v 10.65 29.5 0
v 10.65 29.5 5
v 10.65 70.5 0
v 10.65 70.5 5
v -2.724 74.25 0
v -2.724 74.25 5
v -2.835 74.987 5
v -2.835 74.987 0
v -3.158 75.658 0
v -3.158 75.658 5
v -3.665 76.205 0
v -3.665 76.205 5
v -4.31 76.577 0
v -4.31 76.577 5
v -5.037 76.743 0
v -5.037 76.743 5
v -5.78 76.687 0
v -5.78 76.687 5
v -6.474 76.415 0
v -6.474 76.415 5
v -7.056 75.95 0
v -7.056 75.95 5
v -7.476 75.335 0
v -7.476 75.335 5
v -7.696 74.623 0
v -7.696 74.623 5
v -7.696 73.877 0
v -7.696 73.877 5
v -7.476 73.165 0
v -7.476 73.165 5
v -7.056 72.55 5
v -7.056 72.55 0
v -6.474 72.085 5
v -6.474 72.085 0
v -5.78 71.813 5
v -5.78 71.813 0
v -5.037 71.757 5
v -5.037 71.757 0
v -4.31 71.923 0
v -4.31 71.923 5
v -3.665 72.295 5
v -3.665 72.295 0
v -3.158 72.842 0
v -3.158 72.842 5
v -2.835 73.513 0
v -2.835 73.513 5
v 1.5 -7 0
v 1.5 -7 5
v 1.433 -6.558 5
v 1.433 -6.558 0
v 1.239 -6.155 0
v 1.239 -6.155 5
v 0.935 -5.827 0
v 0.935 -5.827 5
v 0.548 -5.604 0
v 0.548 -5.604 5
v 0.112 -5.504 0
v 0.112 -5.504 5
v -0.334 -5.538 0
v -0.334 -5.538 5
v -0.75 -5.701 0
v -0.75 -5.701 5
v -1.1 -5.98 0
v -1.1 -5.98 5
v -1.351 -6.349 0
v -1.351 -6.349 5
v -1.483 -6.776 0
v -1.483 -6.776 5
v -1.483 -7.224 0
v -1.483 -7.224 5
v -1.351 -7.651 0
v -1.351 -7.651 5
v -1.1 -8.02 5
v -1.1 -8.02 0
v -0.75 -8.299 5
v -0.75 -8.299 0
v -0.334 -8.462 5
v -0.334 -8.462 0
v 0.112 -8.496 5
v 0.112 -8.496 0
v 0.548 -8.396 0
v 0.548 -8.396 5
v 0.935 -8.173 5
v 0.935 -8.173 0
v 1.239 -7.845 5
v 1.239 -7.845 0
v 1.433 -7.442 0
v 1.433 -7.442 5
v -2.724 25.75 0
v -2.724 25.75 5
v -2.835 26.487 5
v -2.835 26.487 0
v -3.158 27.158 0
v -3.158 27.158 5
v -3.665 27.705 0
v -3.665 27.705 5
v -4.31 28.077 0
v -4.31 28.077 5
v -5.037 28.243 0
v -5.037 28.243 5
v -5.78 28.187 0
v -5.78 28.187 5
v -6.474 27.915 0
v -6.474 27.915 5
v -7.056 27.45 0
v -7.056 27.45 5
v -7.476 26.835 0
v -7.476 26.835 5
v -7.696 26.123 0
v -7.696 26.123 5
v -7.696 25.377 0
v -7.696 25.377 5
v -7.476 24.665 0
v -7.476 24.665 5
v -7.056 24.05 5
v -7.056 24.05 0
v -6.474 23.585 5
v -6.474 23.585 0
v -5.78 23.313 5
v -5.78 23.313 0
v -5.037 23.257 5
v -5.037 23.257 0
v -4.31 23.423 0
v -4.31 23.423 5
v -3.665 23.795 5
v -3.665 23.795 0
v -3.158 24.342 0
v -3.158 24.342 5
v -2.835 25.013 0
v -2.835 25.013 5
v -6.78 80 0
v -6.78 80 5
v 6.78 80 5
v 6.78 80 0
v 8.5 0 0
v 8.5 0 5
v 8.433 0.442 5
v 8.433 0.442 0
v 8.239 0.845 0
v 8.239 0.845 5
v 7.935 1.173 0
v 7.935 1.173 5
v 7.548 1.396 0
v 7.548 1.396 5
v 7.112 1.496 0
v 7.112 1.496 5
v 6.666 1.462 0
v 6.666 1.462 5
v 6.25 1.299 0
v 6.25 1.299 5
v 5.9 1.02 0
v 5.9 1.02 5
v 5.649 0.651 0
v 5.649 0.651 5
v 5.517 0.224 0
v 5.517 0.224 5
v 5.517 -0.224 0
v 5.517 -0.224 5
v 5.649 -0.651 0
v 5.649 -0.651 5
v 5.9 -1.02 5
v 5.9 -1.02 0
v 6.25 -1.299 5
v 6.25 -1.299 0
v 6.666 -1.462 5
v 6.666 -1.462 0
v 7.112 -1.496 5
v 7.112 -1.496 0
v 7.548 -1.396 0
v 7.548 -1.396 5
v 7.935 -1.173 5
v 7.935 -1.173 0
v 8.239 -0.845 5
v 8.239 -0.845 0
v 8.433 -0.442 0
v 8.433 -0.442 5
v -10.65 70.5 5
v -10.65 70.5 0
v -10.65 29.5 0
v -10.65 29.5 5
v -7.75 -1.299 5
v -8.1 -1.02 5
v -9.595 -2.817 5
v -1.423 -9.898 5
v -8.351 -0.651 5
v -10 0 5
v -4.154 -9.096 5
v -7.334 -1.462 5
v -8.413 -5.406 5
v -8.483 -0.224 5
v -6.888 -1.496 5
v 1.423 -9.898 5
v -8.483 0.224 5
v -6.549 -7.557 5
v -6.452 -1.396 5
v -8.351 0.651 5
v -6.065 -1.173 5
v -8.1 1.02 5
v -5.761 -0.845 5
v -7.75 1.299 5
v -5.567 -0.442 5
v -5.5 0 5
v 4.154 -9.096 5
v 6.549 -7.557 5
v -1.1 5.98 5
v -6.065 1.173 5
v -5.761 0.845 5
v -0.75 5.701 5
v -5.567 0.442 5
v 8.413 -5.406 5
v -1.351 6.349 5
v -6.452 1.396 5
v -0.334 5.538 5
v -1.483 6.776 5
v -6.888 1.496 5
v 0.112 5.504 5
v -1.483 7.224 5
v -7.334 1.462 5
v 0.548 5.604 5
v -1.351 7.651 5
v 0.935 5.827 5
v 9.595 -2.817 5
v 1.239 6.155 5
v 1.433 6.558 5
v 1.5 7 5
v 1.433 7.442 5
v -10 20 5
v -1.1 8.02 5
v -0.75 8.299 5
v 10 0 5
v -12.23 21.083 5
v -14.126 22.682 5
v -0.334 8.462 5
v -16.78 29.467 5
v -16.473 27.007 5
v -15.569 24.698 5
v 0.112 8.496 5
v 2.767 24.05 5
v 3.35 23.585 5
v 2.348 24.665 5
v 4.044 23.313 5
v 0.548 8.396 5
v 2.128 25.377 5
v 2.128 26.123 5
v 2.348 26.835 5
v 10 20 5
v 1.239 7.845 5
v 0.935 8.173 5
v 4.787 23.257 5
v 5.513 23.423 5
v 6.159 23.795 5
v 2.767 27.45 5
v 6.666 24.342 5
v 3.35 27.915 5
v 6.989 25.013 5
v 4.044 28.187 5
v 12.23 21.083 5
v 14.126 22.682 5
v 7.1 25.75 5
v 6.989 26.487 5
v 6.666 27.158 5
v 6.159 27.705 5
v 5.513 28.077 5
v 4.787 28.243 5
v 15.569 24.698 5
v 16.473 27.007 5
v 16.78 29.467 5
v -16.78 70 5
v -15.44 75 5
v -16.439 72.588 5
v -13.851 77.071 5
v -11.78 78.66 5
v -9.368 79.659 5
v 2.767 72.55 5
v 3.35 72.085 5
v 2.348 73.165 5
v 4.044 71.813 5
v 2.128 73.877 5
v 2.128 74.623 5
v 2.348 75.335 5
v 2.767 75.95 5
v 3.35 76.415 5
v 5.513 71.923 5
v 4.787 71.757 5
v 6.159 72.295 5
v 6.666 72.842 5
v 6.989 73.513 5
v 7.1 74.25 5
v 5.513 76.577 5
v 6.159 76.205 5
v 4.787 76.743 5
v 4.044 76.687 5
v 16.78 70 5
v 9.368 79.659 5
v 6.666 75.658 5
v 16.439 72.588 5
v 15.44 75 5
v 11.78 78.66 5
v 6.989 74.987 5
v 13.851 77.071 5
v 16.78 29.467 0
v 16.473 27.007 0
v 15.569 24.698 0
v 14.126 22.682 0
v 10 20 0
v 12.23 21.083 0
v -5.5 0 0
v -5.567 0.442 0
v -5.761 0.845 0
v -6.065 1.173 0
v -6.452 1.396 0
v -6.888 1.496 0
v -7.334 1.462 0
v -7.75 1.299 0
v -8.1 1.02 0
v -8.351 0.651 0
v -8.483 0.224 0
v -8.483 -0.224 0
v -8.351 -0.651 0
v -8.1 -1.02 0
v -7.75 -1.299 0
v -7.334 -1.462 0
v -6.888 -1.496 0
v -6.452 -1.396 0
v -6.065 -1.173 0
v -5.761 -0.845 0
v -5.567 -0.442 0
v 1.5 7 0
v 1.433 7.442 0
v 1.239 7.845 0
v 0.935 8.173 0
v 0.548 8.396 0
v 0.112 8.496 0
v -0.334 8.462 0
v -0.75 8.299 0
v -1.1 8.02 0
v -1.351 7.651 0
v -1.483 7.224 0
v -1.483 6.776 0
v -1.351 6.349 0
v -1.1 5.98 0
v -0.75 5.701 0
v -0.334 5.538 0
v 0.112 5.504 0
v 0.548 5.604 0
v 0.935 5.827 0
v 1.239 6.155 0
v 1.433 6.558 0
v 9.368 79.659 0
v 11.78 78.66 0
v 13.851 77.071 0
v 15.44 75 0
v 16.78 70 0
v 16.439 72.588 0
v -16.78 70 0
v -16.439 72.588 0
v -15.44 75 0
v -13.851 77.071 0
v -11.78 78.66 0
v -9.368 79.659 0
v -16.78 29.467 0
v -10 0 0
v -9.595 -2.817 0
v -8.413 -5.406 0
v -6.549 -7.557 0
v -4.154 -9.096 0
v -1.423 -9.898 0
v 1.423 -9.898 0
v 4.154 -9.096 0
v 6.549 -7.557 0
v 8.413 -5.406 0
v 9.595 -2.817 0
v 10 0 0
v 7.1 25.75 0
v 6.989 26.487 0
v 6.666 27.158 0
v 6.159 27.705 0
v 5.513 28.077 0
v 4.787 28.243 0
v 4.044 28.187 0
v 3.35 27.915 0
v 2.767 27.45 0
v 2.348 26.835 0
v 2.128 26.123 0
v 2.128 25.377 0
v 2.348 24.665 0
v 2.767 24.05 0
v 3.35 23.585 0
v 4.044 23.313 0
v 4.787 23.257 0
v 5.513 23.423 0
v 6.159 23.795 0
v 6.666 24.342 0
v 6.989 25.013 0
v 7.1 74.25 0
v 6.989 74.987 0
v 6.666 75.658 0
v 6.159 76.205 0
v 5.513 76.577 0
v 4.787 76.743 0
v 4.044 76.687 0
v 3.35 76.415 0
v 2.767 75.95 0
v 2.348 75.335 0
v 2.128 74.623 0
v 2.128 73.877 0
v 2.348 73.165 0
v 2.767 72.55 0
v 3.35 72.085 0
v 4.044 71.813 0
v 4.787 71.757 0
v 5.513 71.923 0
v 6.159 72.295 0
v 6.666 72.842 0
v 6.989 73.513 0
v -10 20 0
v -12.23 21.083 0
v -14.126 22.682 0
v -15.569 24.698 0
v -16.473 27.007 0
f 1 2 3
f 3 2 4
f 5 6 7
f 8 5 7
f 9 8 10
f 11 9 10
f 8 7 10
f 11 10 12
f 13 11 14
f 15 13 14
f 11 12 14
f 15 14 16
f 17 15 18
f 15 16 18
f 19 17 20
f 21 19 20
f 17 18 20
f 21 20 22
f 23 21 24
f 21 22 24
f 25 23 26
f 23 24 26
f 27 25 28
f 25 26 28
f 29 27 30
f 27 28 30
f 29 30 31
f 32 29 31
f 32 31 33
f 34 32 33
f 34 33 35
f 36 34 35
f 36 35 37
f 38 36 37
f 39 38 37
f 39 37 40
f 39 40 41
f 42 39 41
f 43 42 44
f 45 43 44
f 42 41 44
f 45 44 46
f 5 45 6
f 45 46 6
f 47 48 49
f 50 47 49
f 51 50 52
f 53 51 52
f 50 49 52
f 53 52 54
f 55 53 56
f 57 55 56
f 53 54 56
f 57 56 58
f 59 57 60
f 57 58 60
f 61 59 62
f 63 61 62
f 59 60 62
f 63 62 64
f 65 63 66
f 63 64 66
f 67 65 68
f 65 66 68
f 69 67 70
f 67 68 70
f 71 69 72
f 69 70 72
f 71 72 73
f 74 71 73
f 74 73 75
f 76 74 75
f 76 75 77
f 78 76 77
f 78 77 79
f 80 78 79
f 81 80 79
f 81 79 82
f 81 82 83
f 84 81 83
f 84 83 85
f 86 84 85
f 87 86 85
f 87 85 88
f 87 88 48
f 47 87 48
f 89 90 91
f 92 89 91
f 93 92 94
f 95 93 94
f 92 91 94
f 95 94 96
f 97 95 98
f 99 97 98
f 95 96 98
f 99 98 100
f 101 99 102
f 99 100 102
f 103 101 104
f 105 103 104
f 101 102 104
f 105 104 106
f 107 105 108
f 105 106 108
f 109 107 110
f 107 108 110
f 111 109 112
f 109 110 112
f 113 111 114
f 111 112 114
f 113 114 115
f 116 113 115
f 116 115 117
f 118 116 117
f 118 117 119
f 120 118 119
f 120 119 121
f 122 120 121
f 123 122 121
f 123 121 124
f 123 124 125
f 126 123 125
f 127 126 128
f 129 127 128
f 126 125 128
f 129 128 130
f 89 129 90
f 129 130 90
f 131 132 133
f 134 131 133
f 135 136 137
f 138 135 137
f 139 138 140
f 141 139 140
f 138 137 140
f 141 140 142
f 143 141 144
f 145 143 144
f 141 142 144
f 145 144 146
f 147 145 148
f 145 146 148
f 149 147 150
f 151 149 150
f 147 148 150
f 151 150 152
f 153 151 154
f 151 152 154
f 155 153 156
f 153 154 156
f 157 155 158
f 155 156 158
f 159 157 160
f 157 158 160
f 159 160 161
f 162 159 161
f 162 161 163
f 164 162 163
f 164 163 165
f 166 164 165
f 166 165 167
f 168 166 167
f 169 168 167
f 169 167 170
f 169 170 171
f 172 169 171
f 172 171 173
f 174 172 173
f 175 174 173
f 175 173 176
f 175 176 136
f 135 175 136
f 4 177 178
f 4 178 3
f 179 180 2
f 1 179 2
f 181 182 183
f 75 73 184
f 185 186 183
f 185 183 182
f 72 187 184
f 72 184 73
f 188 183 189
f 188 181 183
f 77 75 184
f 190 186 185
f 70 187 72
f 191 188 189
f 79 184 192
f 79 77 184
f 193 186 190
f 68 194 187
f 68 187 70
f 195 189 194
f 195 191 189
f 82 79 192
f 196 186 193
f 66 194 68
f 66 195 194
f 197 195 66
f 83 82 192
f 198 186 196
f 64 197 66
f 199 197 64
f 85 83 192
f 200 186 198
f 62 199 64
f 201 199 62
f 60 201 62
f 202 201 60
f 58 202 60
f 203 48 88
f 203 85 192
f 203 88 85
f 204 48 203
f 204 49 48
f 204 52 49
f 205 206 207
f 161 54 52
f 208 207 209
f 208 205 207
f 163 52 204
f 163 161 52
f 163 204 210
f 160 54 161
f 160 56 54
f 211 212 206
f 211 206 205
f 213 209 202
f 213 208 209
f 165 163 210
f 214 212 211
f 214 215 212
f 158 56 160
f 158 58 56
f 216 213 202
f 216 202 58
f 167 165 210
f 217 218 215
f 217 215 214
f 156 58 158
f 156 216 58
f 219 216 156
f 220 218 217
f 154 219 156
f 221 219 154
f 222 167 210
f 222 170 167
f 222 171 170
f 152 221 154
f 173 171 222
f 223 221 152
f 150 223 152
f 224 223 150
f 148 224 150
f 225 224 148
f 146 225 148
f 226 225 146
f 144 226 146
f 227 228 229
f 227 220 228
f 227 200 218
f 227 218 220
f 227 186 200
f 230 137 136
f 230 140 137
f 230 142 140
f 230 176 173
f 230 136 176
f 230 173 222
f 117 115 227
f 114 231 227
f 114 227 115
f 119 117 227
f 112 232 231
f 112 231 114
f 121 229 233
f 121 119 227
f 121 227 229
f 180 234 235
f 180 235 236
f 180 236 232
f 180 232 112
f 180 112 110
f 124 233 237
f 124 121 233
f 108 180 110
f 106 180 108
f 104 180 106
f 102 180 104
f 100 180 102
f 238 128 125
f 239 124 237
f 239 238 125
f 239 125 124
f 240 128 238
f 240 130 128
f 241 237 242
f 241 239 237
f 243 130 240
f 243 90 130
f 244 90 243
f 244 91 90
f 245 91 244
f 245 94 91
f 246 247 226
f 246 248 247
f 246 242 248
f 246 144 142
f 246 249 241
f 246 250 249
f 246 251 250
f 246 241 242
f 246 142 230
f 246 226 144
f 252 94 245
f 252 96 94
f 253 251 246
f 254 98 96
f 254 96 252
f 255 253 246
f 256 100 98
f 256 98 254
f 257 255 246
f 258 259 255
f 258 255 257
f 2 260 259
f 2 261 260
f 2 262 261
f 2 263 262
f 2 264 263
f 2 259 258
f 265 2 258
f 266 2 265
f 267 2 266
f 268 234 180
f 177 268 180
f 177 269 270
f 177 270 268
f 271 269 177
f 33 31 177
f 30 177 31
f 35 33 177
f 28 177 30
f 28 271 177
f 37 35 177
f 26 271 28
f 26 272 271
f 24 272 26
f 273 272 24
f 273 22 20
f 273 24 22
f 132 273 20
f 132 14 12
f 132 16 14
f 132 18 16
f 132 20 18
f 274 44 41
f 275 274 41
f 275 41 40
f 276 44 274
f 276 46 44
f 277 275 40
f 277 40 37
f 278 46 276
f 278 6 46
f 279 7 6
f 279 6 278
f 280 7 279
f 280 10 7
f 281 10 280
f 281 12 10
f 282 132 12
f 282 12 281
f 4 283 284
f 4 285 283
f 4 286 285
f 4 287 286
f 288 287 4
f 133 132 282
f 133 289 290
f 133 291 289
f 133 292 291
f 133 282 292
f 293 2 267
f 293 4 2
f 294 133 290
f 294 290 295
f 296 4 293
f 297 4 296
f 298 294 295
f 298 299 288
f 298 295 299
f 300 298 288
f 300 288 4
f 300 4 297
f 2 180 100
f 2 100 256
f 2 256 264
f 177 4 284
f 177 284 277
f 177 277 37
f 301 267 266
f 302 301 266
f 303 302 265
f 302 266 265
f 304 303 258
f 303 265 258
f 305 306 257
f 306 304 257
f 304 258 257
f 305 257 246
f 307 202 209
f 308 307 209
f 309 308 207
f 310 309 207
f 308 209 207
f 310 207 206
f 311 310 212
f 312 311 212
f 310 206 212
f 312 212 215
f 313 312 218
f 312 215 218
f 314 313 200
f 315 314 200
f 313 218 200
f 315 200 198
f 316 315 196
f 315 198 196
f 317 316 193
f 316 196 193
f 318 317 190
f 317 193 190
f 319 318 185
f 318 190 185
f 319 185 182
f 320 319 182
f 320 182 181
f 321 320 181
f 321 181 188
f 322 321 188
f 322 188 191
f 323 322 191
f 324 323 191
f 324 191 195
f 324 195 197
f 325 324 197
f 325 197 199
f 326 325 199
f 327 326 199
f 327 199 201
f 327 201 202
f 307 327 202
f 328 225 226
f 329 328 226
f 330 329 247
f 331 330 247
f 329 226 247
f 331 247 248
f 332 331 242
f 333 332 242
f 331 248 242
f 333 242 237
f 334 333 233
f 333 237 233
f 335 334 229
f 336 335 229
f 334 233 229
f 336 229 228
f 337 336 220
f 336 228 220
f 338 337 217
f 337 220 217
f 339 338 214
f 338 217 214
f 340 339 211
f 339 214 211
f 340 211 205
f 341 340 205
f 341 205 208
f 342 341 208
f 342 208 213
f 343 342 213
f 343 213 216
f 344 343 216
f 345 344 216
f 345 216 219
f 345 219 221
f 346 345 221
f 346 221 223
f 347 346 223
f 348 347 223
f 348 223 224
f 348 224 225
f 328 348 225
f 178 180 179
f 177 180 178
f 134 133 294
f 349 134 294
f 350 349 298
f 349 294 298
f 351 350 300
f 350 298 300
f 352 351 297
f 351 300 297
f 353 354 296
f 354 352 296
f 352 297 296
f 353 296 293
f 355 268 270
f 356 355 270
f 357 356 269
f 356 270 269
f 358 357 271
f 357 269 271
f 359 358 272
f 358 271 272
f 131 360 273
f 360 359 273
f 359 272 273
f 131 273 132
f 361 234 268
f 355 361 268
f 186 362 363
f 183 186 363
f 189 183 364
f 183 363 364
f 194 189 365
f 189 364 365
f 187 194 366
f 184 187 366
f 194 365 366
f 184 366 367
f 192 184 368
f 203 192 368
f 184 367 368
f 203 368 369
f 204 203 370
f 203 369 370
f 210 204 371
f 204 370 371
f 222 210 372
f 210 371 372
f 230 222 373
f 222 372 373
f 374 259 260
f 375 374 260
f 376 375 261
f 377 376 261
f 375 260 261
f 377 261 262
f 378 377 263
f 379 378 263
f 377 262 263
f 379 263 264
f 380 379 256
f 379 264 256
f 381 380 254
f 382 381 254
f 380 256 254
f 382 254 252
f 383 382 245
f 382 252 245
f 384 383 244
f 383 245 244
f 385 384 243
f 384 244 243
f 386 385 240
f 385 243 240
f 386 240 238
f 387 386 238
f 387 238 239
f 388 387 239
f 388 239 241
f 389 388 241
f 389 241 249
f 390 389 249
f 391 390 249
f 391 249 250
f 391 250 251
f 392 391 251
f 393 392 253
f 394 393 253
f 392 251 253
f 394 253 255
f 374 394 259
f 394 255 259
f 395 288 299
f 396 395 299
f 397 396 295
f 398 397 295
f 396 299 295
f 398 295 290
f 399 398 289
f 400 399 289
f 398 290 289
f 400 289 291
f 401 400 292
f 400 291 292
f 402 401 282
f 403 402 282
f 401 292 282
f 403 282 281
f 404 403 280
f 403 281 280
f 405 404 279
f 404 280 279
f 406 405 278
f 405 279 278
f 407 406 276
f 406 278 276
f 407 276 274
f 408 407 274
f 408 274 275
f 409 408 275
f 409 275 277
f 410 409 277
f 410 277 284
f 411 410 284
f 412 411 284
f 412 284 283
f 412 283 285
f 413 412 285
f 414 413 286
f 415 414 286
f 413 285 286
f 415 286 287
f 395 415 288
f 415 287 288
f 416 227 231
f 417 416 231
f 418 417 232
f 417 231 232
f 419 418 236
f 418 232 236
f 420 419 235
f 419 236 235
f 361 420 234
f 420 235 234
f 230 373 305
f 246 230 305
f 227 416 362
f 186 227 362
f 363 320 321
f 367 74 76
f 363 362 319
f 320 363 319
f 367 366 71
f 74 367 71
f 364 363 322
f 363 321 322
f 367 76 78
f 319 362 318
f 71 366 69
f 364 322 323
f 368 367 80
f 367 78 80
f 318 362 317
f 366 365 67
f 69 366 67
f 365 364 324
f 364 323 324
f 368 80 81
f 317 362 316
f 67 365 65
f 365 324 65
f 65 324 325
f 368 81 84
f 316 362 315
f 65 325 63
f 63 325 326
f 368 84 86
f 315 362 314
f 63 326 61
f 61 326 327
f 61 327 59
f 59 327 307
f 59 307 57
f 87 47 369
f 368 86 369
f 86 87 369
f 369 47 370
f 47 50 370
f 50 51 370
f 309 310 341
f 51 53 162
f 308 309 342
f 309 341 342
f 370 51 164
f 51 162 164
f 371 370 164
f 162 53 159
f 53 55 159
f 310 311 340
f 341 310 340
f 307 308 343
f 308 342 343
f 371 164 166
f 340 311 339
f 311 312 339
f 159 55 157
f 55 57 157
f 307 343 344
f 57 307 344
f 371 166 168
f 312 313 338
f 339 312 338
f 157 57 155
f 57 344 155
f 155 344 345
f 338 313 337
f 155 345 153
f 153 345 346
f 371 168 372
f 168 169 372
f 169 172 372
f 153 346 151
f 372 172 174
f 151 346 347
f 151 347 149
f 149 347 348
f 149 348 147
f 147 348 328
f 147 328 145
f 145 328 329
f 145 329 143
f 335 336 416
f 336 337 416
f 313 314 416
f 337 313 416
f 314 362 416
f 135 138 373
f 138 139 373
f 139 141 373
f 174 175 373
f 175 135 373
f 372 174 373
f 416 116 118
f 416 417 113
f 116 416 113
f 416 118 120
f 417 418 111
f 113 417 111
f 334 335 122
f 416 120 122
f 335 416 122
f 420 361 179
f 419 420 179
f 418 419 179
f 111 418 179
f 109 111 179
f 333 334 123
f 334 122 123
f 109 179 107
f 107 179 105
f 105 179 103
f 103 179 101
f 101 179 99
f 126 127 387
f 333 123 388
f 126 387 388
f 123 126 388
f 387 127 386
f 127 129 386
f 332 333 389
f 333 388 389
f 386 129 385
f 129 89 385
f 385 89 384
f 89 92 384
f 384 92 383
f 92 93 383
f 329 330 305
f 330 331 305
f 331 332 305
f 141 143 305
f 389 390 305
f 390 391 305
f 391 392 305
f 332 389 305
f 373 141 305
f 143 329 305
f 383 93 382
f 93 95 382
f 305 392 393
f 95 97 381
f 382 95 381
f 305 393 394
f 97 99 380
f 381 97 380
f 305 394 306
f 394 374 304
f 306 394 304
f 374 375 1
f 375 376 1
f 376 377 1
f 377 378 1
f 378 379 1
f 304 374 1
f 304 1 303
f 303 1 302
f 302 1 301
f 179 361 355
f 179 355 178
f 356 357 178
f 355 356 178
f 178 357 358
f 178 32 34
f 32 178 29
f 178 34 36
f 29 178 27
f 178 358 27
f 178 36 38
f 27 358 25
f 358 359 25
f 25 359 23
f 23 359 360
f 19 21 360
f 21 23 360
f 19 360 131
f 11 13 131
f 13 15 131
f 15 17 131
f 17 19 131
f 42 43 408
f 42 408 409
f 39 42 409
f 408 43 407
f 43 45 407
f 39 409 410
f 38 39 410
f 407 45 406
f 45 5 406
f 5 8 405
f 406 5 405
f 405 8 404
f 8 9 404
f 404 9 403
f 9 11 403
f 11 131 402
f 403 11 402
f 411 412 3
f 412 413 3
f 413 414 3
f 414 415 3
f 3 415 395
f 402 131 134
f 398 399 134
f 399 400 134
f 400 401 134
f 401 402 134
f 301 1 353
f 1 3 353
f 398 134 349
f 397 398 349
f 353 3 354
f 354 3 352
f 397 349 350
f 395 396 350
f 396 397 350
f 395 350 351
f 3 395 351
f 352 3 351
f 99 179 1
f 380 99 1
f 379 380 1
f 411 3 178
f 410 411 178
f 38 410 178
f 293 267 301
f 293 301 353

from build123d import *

# Parameters (mm, degrees)
BOSS_EXTRUDE1_DEPTH = 5
SKETCH2_R           = 1.5
CUT_EXTRUDE1_DEPTH  = 10
SKETCH4_W           = 33.56
SKETCH4_H           = 60
BOSS_EXTRUDE2_DEPTH = 5
FILLET1_R           = 10
SKETCH3_R           = 2.5
SKETCH3_W           = 21.3
SKETCH3_H           = 41
CUT_EXTRUDE2_DEPTH  = 5


with BuildPart() as part:
    # Sketch1 → Boss-Extrude1 (new body)
    with BuildSketch(Plane.XY):
        with BuildLine():
            Line((10, 0), (10, 80))
            Line((10, 80), (-10, 80))
            Line((-10, 80), (-10, 0))
            ThreePointArc((-10, 0), (0, -10), (10, 0))
        make_face()
    extrude(amount=BOSS_EXTRUDE1_DEPTH)

    # Sketch2 → Cut-Extrude1 (cut)
    with BuildSketch(Plane.XY.offset(5)):
        with Locations((0, 7)):
            Circle(SKETCH2_R)
        with Locations((7, 0)):
            Circle(SKETCH2_R)
        with Locations((0, -7)):
            Circle(SKETCH2_R)
        with Locations((-7, 0)):
            Circle(SKETCH2_R)
    extrude(amount=-CUT_EXTRUDE1_DEPTH, mode=Mode.SUBTRACT)

    # Sketch4 → Boss-Extrude2 (add)
    with BuildSketch(Plane.XY.offset(5)):
        with Locations((0, 50)):
            Rectangle(SKETCH4_W, SKETCH4_H)
    extrude(amount=-BOSS_EXTRUDE2_DEPTH)

    # Fillet1
    # the kernel refuses this fillet: 10 mm, written as the material it takes off along each edge
    with BuildSketch(Plane(origin=(16.78, 80, 30), x_dir=(-1, 0, 0), z_dir=(0, 0, -1)), Plane(origin=(-16.78, 80, 30), x_dir=(0, -1, 0), z_dir=(0, 0, -1))) as fillet1_piece_1:
        with BuildLine():
            CenterArc((FILLET1_R, -FILLET1_R), FILLET1_R, 90, 90)
            Line((0, -FILLET1_R), (-FILLET1_R * 0.02, -FILLET1_R))
            Line((-FILLET1_R * 0.02, -FILLET1_R), (-FILLET1_R * 0.02, FILLET1_R * 0.02))
            Line((-FILLET1_R * 0.02, FILLET1_R * 0.02), (FILLET1_R, FILLET1_R * 0.02))
            Line((FILLET1_R, FILLET1_R * 0.02), (FILLET1_R, 0))
        make_face()
    extrude(amount=55, mode=Mode.SUBTRACT)
    with BuildSketch(Plane(origin=(16.78, 20, 28.668491714), x_dir=(0, 1, 0), z_dir=(0, 0, -1))) as fillet1_piece_2:
        with BuildLine():
            CenterArc((9.467396685, -10), FILLET1_R, 90, 71.216080389)
            Line((0, -6.78), (-0.189347934, -6.7156))
            ThreePointArc((-0.189347934, -6.7156), (-0.2, -3.39), (-0.2, 0))
            Line((-0.2, 0), (0, 0.2))
            Line((0, 0.2), (9.467396685, 0.2))
            Line((9.467396685, 0.2), (9.467396685, 0))
        make_face()
    extrude(amount=52.336983427, mode=Mode.SUBTRACT)
    with BuildSketch(Plane(origin=(-16.78, 20, 28.668491714), x_dir=(1, 0, 0), z_dir=(0, 0, -1))) as fillet1_piece_3:
        with BuildLine():
            CenterArc((10, -9.467396685), FILLET1_R, 108.783919611, 71.216080389)
            Line((0, -9.467396685), (-0.2, -9.467396685))
            Line((-0.2, -9.467396685), (-0.2, 0))
            Line((-0.2, 0), (0, 0.2))
            ThreePointArc((0, 0.2), (3.39, 0.2), (6.7156, 0.189347934))
            Line((6.7156, 0.189347934), (6.78, 0))
        make_face()
    extrude(amount=52.336983427, mode=Mode.SUBTRACT)

    # Sketch3 → Cut-Extrude2 (cut)
    with BuildSketch(Plane.XY.offset(5)):
        with Locations((4.6, 74.25)):
            Circle(SKETCH3_R)
        with Locations((-5.22372371, 74.25)):
            Circle(SKETCH3_R)
        with Locations((-5.22372371, 25.75)):
            Circle(SKETCH3_R)
        with Locations((4.6, 25.75)):
            Circle(SKETCH3_R)
        with Locations((0, 50)):
            Rectangle(SKETCH3_W, SKETCH3_H)
    extrude(amount=-CUT_EXTRUDE2_DEPTH, mode=Mode.SUBTRACT)


solid = part.part
